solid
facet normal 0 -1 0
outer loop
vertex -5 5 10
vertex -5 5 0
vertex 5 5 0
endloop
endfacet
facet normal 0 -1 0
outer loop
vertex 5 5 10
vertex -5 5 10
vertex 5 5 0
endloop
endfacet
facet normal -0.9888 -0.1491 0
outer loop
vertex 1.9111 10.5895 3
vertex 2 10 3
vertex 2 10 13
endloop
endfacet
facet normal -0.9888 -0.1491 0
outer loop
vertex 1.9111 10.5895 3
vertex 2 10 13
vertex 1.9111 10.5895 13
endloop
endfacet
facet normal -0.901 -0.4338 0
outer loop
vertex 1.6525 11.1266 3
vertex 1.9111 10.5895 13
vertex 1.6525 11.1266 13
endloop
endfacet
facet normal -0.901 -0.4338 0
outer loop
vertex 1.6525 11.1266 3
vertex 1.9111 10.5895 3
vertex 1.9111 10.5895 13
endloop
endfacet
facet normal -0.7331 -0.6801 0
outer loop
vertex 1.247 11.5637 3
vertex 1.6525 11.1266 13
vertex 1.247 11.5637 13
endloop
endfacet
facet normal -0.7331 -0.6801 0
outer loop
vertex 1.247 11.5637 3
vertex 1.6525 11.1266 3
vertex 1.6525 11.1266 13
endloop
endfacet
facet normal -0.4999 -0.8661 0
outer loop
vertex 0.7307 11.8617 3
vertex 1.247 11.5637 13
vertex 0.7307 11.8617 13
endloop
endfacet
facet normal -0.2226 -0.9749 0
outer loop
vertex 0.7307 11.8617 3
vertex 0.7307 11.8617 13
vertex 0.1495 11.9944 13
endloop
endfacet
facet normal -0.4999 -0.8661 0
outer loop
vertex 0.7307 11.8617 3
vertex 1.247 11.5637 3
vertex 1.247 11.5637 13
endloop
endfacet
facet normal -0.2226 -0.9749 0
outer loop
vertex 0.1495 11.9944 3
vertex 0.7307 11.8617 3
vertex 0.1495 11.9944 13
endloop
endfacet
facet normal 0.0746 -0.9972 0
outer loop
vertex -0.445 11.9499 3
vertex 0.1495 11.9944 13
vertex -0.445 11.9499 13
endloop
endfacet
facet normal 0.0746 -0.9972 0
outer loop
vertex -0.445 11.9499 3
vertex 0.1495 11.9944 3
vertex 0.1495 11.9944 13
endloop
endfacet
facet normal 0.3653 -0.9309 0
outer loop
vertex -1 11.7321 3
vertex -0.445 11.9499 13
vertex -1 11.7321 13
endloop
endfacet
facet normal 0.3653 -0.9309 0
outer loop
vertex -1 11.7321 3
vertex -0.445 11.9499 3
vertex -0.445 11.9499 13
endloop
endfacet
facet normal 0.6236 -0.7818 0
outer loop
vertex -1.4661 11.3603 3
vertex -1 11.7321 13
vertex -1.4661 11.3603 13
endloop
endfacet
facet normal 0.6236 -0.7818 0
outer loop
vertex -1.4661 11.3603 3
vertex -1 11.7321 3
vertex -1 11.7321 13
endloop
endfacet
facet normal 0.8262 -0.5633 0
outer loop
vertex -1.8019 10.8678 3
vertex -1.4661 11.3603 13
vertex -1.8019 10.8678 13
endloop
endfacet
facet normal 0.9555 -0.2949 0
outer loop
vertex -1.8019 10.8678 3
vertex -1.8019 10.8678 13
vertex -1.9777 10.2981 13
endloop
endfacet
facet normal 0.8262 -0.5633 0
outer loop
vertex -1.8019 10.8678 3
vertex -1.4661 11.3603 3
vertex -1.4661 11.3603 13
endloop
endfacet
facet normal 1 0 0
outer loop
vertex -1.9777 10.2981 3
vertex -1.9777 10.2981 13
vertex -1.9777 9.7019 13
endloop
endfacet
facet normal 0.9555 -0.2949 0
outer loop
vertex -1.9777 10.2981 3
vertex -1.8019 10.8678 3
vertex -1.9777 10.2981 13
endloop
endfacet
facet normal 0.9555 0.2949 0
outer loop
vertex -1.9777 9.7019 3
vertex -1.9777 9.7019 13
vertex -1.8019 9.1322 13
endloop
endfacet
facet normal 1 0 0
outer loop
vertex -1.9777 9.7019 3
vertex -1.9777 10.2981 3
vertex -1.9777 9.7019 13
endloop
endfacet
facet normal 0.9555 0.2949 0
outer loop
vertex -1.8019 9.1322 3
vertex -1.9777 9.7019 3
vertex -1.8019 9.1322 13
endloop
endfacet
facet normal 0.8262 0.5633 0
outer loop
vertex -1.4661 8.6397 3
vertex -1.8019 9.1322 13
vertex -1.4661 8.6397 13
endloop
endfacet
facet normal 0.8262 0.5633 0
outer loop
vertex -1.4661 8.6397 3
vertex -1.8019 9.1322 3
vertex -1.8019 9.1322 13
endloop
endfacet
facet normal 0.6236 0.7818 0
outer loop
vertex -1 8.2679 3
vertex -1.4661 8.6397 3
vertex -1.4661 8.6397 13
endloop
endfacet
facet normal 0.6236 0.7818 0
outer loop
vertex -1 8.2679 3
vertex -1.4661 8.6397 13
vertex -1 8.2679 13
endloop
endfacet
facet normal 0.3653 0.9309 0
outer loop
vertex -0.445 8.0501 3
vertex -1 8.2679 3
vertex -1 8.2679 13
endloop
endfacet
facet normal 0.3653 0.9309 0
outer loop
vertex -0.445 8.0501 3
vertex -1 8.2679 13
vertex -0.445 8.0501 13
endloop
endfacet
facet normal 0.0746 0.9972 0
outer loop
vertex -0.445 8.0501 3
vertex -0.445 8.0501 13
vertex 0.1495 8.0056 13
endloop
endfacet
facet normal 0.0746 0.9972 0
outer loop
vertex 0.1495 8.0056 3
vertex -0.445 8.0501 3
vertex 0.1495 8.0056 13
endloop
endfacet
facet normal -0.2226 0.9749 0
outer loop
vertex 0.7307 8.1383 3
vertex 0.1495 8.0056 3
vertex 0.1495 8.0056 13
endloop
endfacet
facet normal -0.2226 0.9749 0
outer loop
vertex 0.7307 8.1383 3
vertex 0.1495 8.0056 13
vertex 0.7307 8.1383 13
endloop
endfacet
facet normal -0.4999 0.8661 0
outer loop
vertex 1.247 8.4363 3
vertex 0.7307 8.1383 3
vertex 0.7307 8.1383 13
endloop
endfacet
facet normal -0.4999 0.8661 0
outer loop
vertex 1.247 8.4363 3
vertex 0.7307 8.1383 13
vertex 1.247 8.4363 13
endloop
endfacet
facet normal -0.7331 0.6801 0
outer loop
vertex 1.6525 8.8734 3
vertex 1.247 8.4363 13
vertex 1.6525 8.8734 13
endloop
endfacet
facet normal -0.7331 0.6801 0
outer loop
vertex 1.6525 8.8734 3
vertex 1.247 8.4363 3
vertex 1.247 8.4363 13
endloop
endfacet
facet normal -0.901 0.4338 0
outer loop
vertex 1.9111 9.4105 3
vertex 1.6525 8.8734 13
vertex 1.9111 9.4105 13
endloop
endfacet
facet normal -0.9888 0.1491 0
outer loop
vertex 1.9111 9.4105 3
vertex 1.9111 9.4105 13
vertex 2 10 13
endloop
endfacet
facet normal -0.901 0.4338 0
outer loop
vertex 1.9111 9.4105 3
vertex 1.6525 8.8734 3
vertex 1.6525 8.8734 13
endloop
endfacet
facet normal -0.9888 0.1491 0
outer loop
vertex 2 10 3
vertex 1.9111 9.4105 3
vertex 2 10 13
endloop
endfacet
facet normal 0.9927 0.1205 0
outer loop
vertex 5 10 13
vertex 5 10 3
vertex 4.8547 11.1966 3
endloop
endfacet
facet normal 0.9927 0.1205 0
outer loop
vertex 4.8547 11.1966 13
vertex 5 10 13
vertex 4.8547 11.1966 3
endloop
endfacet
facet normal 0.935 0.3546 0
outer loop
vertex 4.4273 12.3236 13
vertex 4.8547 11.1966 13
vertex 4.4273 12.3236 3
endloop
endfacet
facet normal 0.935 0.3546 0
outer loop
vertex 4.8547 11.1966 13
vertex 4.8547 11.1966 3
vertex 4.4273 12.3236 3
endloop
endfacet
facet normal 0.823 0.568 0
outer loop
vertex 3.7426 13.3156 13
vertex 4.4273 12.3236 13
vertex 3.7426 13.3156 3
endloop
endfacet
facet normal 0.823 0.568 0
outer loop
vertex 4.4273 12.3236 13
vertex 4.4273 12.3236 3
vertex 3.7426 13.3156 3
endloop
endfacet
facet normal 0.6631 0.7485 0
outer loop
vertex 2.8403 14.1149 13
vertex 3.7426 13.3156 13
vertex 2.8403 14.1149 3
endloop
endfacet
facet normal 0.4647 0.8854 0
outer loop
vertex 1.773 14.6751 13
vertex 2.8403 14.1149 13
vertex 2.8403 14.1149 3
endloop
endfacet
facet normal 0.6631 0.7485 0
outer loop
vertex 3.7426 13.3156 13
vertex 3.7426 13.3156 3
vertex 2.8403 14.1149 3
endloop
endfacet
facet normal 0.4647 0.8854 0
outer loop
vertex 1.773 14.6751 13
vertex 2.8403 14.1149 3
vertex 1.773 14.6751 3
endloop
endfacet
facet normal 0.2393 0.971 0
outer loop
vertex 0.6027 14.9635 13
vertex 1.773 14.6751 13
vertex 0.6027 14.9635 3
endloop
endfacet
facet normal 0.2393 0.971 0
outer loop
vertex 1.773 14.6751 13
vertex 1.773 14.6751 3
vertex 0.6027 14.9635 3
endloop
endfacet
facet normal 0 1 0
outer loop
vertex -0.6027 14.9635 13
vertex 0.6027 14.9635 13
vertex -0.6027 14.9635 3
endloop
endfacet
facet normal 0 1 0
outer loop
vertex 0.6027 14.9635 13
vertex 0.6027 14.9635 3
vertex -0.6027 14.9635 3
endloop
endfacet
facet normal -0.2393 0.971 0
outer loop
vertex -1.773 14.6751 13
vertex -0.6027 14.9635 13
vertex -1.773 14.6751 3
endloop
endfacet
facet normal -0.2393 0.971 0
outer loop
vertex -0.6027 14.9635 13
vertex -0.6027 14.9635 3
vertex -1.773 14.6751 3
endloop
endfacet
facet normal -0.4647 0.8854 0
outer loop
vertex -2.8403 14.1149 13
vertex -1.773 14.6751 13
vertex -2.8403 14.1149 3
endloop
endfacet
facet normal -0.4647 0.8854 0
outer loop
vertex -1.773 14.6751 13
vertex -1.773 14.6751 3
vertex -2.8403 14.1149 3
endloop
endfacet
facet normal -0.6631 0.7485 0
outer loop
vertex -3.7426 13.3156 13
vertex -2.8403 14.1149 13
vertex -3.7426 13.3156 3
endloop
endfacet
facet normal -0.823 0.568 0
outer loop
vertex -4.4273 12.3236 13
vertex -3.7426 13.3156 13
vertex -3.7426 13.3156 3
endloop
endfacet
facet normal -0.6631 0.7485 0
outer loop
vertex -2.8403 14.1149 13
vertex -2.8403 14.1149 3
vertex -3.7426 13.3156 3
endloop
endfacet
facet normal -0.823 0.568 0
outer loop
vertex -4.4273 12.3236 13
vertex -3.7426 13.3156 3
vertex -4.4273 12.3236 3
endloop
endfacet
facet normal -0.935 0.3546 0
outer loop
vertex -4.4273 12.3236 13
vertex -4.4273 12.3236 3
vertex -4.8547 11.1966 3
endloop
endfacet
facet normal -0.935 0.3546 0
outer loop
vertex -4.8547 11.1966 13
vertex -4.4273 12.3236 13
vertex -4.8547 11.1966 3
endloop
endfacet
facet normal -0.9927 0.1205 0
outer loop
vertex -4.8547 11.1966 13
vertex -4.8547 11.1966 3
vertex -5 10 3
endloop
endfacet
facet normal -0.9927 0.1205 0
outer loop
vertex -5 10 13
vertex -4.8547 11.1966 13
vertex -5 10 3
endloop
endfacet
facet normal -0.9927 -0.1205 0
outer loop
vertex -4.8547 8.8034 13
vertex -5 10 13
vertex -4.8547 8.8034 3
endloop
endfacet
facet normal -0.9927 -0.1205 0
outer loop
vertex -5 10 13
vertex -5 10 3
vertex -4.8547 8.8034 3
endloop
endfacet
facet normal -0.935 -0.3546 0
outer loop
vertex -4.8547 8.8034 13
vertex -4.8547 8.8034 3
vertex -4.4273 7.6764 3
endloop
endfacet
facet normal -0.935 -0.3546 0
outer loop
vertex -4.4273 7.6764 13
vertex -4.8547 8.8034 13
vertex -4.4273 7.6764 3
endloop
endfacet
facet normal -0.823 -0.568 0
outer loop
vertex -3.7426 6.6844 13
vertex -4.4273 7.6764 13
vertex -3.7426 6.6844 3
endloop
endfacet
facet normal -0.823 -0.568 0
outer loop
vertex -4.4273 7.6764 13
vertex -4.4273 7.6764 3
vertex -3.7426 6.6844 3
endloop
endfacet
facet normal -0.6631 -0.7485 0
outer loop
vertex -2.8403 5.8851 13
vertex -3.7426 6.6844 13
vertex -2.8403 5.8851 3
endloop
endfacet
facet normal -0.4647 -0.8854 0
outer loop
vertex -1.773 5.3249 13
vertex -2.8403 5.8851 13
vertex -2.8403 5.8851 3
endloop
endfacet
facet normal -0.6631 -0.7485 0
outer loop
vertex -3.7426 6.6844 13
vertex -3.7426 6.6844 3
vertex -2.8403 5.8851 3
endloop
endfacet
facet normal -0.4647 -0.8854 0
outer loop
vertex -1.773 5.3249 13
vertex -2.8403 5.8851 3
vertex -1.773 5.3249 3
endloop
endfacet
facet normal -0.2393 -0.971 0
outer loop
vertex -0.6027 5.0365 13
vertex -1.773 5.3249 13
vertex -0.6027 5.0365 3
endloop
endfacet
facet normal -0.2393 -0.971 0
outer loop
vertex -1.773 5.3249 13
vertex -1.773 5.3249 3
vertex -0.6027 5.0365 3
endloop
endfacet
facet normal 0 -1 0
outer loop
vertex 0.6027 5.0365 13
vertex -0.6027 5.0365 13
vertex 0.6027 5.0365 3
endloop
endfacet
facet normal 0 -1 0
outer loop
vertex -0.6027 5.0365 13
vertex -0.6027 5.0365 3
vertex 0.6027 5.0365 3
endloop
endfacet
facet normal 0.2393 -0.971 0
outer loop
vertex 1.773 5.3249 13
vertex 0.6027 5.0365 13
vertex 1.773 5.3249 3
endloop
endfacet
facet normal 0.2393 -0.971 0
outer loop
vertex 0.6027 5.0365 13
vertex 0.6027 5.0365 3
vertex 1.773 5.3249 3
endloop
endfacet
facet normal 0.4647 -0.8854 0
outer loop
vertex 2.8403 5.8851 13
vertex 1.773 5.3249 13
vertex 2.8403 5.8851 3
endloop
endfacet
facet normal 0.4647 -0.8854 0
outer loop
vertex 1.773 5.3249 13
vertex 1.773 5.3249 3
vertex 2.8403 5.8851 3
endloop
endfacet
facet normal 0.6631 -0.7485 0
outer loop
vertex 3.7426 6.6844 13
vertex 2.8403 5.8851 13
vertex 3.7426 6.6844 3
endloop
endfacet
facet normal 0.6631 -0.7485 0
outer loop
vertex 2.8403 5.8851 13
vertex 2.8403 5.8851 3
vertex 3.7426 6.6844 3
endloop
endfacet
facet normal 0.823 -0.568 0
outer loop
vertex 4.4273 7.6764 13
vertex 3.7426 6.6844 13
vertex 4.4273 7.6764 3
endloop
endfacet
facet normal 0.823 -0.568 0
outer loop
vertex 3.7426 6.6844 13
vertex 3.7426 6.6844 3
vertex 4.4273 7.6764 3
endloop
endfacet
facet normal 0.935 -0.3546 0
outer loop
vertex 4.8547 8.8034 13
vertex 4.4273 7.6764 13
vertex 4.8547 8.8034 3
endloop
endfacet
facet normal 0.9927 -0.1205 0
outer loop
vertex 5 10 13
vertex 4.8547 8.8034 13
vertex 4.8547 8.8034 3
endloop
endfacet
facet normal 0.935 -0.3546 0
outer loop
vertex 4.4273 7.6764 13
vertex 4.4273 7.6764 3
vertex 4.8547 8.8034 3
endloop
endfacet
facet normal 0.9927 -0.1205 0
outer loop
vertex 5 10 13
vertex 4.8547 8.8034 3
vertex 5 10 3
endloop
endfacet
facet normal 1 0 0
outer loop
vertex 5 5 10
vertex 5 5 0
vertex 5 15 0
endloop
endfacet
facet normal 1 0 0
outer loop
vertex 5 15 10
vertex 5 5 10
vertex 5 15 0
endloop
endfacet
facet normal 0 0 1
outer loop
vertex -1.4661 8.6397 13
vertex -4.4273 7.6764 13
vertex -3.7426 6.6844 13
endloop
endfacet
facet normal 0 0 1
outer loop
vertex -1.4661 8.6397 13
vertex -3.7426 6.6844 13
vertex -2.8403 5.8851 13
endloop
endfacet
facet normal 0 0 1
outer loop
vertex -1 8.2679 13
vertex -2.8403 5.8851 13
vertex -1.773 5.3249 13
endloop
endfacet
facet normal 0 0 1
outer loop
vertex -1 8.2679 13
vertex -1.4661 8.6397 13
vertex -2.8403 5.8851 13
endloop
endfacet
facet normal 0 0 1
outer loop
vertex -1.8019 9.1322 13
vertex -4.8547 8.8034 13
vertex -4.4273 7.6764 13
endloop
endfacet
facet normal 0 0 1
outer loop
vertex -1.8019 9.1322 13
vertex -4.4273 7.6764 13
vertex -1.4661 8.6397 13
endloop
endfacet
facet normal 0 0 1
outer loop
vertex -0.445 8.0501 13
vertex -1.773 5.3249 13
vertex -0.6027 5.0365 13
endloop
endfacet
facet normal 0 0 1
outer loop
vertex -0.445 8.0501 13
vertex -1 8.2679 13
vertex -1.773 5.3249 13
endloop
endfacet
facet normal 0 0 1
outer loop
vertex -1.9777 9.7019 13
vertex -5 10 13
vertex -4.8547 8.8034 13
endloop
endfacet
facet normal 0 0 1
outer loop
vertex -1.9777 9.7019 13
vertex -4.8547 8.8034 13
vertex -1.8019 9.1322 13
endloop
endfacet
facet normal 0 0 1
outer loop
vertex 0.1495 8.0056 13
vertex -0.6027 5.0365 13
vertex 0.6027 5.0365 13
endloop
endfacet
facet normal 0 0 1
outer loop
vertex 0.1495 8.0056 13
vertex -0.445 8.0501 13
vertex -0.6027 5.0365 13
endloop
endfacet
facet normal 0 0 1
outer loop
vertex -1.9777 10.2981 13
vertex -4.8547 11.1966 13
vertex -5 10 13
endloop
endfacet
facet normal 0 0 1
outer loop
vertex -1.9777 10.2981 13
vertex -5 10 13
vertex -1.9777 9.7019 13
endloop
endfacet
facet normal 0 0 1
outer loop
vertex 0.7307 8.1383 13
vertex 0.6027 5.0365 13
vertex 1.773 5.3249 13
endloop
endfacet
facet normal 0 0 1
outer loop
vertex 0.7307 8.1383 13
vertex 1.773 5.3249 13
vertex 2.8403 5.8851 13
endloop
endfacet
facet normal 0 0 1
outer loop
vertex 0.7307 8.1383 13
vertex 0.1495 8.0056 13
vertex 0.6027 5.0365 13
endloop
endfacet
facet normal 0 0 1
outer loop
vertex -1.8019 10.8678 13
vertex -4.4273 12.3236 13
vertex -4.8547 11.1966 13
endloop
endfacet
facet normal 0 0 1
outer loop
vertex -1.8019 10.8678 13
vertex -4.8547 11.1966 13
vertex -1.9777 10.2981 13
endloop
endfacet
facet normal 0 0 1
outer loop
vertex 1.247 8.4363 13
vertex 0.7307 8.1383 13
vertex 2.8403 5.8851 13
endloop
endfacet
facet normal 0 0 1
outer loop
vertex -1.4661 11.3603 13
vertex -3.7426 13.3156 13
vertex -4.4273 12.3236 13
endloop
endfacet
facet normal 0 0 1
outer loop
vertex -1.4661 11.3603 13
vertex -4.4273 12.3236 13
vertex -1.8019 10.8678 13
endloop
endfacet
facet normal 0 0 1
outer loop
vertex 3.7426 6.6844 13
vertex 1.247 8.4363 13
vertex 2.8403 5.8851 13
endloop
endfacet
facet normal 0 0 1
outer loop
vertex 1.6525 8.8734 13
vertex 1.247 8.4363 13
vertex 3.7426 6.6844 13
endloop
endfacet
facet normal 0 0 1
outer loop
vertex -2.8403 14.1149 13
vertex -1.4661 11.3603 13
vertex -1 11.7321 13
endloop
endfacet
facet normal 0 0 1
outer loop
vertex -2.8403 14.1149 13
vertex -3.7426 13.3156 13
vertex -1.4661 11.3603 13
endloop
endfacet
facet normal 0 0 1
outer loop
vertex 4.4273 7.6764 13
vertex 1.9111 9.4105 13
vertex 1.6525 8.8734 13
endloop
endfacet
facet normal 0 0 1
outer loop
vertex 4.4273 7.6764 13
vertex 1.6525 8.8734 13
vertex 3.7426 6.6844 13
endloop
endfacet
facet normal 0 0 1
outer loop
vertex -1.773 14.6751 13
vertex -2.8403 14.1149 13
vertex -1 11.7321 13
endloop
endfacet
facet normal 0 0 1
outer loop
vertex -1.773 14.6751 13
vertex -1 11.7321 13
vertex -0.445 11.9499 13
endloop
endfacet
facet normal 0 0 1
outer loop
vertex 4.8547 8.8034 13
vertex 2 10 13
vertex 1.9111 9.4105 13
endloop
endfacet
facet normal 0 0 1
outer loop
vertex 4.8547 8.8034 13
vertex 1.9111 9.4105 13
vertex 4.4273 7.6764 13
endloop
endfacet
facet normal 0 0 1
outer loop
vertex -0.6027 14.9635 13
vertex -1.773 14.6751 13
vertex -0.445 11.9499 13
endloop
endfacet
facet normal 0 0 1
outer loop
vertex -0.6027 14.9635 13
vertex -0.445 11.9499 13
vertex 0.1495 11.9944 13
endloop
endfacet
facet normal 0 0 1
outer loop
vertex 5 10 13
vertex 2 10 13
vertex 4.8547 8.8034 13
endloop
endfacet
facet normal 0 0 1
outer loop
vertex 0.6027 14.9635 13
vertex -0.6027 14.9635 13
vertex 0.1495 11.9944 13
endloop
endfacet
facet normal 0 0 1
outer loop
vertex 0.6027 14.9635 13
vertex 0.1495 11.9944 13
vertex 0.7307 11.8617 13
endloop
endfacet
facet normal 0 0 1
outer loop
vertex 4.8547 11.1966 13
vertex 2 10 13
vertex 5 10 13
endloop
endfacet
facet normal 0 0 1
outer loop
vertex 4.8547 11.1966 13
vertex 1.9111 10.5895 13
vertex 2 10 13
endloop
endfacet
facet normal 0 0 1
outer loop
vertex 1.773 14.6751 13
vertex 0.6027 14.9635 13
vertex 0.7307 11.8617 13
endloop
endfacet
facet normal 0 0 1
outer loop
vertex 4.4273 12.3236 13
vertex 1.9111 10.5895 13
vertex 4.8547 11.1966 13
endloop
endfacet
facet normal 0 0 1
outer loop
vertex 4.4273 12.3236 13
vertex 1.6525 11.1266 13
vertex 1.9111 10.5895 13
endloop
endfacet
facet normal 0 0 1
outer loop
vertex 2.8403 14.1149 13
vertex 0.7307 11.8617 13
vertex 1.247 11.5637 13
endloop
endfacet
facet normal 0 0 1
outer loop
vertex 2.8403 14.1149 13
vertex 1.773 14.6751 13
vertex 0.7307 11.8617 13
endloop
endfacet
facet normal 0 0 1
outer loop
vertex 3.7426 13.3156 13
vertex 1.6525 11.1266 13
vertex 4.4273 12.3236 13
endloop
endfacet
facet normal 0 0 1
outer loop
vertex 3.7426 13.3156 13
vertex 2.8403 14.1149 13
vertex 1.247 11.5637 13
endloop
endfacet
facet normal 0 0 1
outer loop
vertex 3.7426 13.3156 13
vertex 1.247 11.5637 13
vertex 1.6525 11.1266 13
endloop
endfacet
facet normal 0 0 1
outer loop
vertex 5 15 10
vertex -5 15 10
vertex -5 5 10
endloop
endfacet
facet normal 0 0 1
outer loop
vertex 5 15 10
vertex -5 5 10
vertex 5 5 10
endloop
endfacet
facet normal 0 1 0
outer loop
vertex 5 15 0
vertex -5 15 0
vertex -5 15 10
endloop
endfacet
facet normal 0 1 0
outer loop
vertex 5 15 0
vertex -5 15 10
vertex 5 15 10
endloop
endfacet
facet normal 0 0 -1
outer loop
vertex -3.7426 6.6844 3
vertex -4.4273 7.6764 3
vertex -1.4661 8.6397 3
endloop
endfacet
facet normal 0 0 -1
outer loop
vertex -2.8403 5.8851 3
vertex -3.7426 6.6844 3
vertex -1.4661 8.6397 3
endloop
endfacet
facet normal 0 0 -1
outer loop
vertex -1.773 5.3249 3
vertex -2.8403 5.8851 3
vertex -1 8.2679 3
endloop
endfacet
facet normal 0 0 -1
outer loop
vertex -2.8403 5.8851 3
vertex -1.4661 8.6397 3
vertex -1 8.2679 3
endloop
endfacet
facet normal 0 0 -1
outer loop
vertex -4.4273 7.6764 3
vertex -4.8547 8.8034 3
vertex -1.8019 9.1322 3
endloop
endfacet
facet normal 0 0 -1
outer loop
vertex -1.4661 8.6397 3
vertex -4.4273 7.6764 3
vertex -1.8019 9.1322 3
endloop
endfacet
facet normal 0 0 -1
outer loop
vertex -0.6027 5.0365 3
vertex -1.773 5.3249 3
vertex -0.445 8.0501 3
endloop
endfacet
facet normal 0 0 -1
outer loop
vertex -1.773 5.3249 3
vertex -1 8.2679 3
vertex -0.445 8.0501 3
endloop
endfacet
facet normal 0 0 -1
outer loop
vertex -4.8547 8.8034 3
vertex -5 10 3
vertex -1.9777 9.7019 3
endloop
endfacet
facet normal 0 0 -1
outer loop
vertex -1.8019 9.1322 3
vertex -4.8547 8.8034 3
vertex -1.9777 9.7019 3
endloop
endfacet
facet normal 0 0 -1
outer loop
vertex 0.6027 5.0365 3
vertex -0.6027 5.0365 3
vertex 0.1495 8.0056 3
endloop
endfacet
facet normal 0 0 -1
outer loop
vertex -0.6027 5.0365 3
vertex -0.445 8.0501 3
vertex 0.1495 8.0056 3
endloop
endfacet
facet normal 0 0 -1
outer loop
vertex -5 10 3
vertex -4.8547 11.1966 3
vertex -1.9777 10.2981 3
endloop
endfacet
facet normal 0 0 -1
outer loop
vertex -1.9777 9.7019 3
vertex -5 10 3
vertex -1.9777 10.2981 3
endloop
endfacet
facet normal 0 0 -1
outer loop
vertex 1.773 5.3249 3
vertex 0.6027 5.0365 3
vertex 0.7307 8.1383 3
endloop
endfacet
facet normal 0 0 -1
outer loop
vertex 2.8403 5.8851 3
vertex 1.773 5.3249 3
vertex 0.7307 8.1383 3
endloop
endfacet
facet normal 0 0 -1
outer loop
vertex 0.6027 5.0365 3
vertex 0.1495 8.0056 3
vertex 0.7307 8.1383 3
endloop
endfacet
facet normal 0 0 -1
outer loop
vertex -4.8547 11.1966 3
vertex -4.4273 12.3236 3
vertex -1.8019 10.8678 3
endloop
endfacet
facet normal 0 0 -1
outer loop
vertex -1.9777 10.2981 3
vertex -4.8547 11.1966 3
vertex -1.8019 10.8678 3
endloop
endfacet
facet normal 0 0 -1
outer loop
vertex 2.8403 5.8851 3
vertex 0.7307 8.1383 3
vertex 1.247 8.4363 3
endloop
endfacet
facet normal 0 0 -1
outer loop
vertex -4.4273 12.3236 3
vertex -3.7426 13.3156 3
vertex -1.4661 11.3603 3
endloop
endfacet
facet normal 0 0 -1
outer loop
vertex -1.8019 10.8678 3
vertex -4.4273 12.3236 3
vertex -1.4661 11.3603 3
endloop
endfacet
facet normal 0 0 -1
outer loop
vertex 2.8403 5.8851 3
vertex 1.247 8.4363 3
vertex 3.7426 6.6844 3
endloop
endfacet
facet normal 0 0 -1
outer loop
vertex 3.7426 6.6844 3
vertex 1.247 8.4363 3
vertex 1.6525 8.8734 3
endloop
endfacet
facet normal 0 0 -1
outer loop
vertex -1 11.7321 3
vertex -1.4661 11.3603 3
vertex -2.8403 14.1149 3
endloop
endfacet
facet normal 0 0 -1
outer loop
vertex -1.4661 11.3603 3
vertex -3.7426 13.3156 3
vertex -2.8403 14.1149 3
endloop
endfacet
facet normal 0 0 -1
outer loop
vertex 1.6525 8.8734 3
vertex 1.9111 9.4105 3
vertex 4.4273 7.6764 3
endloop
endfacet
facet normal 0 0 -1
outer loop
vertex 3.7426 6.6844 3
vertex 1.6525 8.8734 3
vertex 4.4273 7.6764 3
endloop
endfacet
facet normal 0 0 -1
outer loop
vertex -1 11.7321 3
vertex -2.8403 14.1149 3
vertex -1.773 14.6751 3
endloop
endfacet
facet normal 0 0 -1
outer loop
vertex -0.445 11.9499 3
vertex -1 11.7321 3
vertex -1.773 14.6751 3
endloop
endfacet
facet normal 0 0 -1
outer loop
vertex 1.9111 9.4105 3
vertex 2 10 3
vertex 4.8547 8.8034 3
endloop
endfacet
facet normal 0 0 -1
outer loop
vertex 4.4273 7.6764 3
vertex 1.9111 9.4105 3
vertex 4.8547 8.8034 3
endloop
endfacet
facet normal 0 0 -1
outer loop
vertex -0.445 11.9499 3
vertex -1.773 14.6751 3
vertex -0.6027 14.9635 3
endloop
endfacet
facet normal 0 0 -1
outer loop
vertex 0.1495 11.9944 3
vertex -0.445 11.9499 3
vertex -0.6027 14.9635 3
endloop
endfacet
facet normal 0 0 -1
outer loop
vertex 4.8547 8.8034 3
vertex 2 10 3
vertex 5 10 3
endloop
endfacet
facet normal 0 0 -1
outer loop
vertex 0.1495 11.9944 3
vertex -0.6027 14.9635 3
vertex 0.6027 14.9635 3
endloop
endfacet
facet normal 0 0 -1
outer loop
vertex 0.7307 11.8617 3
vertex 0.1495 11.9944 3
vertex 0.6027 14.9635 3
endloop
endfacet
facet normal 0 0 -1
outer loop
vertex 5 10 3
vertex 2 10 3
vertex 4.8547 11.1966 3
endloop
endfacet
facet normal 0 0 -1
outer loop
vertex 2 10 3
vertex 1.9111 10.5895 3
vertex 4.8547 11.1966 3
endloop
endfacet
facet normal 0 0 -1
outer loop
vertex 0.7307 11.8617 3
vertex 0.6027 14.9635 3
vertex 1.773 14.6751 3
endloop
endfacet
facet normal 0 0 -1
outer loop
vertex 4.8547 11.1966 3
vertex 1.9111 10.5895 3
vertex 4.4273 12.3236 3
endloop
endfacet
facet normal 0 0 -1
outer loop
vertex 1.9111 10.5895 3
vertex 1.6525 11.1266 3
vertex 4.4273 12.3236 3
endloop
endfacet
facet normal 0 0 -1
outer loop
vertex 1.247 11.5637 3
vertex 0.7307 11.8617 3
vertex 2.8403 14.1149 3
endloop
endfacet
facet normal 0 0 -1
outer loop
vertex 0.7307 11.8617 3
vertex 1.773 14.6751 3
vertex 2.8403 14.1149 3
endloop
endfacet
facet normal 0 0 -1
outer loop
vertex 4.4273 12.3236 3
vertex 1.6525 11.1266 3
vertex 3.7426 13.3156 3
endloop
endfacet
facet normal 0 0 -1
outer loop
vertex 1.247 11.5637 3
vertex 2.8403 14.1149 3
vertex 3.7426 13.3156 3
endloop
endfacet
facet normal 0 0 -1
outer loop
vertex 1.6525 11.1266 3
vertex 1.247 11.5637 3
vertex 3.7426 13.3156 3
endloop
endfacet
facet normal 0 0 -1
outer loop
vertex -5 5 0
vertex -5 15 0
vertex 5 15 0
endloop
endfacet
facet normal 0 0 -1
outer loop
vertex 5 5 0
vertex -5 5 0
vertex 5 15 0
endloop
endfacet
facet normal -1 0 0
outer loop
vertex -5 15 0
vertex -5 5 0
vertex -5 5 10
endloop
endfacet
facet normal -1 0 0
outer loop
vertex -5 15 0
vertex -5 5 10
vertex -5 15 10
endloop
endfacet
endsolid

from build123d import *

# Parameters (mm, degrees)
BOX_W      = 10
BOX_H      = 10
BOX_DEPTH  = 10
TUBE_R     = 5
TUBE_R_2   = 2
TUBE_DEPTH = 10


with BuildPart() as cubo:
    # Box → Box (new body)
    with BuildSketch(Plane(origin=(-5, 5, 0), x_dir=(1, 0, 0), z_dir=(0, 0, 1))):
        with Locations((5, 5)):
            Rectangle(BOX_W, BOX_H)
    extrude(amount=BOX_DEPTH)


with BuildPart() as tube:
    # Tube → Tube (new body)
    with BuildSketch(Plane(origin=(0, 10, 3), x_dir=(1, 0, 0), z_dir=(0, 0, 1))):
        Circle(TUBE_R)
        Circle(TUBE_R_2, mode=Mode.SUBTRACT)
    extrude(amount=TUBE_DEPTH)


solid = Compound([cubo.part, tube.part])
